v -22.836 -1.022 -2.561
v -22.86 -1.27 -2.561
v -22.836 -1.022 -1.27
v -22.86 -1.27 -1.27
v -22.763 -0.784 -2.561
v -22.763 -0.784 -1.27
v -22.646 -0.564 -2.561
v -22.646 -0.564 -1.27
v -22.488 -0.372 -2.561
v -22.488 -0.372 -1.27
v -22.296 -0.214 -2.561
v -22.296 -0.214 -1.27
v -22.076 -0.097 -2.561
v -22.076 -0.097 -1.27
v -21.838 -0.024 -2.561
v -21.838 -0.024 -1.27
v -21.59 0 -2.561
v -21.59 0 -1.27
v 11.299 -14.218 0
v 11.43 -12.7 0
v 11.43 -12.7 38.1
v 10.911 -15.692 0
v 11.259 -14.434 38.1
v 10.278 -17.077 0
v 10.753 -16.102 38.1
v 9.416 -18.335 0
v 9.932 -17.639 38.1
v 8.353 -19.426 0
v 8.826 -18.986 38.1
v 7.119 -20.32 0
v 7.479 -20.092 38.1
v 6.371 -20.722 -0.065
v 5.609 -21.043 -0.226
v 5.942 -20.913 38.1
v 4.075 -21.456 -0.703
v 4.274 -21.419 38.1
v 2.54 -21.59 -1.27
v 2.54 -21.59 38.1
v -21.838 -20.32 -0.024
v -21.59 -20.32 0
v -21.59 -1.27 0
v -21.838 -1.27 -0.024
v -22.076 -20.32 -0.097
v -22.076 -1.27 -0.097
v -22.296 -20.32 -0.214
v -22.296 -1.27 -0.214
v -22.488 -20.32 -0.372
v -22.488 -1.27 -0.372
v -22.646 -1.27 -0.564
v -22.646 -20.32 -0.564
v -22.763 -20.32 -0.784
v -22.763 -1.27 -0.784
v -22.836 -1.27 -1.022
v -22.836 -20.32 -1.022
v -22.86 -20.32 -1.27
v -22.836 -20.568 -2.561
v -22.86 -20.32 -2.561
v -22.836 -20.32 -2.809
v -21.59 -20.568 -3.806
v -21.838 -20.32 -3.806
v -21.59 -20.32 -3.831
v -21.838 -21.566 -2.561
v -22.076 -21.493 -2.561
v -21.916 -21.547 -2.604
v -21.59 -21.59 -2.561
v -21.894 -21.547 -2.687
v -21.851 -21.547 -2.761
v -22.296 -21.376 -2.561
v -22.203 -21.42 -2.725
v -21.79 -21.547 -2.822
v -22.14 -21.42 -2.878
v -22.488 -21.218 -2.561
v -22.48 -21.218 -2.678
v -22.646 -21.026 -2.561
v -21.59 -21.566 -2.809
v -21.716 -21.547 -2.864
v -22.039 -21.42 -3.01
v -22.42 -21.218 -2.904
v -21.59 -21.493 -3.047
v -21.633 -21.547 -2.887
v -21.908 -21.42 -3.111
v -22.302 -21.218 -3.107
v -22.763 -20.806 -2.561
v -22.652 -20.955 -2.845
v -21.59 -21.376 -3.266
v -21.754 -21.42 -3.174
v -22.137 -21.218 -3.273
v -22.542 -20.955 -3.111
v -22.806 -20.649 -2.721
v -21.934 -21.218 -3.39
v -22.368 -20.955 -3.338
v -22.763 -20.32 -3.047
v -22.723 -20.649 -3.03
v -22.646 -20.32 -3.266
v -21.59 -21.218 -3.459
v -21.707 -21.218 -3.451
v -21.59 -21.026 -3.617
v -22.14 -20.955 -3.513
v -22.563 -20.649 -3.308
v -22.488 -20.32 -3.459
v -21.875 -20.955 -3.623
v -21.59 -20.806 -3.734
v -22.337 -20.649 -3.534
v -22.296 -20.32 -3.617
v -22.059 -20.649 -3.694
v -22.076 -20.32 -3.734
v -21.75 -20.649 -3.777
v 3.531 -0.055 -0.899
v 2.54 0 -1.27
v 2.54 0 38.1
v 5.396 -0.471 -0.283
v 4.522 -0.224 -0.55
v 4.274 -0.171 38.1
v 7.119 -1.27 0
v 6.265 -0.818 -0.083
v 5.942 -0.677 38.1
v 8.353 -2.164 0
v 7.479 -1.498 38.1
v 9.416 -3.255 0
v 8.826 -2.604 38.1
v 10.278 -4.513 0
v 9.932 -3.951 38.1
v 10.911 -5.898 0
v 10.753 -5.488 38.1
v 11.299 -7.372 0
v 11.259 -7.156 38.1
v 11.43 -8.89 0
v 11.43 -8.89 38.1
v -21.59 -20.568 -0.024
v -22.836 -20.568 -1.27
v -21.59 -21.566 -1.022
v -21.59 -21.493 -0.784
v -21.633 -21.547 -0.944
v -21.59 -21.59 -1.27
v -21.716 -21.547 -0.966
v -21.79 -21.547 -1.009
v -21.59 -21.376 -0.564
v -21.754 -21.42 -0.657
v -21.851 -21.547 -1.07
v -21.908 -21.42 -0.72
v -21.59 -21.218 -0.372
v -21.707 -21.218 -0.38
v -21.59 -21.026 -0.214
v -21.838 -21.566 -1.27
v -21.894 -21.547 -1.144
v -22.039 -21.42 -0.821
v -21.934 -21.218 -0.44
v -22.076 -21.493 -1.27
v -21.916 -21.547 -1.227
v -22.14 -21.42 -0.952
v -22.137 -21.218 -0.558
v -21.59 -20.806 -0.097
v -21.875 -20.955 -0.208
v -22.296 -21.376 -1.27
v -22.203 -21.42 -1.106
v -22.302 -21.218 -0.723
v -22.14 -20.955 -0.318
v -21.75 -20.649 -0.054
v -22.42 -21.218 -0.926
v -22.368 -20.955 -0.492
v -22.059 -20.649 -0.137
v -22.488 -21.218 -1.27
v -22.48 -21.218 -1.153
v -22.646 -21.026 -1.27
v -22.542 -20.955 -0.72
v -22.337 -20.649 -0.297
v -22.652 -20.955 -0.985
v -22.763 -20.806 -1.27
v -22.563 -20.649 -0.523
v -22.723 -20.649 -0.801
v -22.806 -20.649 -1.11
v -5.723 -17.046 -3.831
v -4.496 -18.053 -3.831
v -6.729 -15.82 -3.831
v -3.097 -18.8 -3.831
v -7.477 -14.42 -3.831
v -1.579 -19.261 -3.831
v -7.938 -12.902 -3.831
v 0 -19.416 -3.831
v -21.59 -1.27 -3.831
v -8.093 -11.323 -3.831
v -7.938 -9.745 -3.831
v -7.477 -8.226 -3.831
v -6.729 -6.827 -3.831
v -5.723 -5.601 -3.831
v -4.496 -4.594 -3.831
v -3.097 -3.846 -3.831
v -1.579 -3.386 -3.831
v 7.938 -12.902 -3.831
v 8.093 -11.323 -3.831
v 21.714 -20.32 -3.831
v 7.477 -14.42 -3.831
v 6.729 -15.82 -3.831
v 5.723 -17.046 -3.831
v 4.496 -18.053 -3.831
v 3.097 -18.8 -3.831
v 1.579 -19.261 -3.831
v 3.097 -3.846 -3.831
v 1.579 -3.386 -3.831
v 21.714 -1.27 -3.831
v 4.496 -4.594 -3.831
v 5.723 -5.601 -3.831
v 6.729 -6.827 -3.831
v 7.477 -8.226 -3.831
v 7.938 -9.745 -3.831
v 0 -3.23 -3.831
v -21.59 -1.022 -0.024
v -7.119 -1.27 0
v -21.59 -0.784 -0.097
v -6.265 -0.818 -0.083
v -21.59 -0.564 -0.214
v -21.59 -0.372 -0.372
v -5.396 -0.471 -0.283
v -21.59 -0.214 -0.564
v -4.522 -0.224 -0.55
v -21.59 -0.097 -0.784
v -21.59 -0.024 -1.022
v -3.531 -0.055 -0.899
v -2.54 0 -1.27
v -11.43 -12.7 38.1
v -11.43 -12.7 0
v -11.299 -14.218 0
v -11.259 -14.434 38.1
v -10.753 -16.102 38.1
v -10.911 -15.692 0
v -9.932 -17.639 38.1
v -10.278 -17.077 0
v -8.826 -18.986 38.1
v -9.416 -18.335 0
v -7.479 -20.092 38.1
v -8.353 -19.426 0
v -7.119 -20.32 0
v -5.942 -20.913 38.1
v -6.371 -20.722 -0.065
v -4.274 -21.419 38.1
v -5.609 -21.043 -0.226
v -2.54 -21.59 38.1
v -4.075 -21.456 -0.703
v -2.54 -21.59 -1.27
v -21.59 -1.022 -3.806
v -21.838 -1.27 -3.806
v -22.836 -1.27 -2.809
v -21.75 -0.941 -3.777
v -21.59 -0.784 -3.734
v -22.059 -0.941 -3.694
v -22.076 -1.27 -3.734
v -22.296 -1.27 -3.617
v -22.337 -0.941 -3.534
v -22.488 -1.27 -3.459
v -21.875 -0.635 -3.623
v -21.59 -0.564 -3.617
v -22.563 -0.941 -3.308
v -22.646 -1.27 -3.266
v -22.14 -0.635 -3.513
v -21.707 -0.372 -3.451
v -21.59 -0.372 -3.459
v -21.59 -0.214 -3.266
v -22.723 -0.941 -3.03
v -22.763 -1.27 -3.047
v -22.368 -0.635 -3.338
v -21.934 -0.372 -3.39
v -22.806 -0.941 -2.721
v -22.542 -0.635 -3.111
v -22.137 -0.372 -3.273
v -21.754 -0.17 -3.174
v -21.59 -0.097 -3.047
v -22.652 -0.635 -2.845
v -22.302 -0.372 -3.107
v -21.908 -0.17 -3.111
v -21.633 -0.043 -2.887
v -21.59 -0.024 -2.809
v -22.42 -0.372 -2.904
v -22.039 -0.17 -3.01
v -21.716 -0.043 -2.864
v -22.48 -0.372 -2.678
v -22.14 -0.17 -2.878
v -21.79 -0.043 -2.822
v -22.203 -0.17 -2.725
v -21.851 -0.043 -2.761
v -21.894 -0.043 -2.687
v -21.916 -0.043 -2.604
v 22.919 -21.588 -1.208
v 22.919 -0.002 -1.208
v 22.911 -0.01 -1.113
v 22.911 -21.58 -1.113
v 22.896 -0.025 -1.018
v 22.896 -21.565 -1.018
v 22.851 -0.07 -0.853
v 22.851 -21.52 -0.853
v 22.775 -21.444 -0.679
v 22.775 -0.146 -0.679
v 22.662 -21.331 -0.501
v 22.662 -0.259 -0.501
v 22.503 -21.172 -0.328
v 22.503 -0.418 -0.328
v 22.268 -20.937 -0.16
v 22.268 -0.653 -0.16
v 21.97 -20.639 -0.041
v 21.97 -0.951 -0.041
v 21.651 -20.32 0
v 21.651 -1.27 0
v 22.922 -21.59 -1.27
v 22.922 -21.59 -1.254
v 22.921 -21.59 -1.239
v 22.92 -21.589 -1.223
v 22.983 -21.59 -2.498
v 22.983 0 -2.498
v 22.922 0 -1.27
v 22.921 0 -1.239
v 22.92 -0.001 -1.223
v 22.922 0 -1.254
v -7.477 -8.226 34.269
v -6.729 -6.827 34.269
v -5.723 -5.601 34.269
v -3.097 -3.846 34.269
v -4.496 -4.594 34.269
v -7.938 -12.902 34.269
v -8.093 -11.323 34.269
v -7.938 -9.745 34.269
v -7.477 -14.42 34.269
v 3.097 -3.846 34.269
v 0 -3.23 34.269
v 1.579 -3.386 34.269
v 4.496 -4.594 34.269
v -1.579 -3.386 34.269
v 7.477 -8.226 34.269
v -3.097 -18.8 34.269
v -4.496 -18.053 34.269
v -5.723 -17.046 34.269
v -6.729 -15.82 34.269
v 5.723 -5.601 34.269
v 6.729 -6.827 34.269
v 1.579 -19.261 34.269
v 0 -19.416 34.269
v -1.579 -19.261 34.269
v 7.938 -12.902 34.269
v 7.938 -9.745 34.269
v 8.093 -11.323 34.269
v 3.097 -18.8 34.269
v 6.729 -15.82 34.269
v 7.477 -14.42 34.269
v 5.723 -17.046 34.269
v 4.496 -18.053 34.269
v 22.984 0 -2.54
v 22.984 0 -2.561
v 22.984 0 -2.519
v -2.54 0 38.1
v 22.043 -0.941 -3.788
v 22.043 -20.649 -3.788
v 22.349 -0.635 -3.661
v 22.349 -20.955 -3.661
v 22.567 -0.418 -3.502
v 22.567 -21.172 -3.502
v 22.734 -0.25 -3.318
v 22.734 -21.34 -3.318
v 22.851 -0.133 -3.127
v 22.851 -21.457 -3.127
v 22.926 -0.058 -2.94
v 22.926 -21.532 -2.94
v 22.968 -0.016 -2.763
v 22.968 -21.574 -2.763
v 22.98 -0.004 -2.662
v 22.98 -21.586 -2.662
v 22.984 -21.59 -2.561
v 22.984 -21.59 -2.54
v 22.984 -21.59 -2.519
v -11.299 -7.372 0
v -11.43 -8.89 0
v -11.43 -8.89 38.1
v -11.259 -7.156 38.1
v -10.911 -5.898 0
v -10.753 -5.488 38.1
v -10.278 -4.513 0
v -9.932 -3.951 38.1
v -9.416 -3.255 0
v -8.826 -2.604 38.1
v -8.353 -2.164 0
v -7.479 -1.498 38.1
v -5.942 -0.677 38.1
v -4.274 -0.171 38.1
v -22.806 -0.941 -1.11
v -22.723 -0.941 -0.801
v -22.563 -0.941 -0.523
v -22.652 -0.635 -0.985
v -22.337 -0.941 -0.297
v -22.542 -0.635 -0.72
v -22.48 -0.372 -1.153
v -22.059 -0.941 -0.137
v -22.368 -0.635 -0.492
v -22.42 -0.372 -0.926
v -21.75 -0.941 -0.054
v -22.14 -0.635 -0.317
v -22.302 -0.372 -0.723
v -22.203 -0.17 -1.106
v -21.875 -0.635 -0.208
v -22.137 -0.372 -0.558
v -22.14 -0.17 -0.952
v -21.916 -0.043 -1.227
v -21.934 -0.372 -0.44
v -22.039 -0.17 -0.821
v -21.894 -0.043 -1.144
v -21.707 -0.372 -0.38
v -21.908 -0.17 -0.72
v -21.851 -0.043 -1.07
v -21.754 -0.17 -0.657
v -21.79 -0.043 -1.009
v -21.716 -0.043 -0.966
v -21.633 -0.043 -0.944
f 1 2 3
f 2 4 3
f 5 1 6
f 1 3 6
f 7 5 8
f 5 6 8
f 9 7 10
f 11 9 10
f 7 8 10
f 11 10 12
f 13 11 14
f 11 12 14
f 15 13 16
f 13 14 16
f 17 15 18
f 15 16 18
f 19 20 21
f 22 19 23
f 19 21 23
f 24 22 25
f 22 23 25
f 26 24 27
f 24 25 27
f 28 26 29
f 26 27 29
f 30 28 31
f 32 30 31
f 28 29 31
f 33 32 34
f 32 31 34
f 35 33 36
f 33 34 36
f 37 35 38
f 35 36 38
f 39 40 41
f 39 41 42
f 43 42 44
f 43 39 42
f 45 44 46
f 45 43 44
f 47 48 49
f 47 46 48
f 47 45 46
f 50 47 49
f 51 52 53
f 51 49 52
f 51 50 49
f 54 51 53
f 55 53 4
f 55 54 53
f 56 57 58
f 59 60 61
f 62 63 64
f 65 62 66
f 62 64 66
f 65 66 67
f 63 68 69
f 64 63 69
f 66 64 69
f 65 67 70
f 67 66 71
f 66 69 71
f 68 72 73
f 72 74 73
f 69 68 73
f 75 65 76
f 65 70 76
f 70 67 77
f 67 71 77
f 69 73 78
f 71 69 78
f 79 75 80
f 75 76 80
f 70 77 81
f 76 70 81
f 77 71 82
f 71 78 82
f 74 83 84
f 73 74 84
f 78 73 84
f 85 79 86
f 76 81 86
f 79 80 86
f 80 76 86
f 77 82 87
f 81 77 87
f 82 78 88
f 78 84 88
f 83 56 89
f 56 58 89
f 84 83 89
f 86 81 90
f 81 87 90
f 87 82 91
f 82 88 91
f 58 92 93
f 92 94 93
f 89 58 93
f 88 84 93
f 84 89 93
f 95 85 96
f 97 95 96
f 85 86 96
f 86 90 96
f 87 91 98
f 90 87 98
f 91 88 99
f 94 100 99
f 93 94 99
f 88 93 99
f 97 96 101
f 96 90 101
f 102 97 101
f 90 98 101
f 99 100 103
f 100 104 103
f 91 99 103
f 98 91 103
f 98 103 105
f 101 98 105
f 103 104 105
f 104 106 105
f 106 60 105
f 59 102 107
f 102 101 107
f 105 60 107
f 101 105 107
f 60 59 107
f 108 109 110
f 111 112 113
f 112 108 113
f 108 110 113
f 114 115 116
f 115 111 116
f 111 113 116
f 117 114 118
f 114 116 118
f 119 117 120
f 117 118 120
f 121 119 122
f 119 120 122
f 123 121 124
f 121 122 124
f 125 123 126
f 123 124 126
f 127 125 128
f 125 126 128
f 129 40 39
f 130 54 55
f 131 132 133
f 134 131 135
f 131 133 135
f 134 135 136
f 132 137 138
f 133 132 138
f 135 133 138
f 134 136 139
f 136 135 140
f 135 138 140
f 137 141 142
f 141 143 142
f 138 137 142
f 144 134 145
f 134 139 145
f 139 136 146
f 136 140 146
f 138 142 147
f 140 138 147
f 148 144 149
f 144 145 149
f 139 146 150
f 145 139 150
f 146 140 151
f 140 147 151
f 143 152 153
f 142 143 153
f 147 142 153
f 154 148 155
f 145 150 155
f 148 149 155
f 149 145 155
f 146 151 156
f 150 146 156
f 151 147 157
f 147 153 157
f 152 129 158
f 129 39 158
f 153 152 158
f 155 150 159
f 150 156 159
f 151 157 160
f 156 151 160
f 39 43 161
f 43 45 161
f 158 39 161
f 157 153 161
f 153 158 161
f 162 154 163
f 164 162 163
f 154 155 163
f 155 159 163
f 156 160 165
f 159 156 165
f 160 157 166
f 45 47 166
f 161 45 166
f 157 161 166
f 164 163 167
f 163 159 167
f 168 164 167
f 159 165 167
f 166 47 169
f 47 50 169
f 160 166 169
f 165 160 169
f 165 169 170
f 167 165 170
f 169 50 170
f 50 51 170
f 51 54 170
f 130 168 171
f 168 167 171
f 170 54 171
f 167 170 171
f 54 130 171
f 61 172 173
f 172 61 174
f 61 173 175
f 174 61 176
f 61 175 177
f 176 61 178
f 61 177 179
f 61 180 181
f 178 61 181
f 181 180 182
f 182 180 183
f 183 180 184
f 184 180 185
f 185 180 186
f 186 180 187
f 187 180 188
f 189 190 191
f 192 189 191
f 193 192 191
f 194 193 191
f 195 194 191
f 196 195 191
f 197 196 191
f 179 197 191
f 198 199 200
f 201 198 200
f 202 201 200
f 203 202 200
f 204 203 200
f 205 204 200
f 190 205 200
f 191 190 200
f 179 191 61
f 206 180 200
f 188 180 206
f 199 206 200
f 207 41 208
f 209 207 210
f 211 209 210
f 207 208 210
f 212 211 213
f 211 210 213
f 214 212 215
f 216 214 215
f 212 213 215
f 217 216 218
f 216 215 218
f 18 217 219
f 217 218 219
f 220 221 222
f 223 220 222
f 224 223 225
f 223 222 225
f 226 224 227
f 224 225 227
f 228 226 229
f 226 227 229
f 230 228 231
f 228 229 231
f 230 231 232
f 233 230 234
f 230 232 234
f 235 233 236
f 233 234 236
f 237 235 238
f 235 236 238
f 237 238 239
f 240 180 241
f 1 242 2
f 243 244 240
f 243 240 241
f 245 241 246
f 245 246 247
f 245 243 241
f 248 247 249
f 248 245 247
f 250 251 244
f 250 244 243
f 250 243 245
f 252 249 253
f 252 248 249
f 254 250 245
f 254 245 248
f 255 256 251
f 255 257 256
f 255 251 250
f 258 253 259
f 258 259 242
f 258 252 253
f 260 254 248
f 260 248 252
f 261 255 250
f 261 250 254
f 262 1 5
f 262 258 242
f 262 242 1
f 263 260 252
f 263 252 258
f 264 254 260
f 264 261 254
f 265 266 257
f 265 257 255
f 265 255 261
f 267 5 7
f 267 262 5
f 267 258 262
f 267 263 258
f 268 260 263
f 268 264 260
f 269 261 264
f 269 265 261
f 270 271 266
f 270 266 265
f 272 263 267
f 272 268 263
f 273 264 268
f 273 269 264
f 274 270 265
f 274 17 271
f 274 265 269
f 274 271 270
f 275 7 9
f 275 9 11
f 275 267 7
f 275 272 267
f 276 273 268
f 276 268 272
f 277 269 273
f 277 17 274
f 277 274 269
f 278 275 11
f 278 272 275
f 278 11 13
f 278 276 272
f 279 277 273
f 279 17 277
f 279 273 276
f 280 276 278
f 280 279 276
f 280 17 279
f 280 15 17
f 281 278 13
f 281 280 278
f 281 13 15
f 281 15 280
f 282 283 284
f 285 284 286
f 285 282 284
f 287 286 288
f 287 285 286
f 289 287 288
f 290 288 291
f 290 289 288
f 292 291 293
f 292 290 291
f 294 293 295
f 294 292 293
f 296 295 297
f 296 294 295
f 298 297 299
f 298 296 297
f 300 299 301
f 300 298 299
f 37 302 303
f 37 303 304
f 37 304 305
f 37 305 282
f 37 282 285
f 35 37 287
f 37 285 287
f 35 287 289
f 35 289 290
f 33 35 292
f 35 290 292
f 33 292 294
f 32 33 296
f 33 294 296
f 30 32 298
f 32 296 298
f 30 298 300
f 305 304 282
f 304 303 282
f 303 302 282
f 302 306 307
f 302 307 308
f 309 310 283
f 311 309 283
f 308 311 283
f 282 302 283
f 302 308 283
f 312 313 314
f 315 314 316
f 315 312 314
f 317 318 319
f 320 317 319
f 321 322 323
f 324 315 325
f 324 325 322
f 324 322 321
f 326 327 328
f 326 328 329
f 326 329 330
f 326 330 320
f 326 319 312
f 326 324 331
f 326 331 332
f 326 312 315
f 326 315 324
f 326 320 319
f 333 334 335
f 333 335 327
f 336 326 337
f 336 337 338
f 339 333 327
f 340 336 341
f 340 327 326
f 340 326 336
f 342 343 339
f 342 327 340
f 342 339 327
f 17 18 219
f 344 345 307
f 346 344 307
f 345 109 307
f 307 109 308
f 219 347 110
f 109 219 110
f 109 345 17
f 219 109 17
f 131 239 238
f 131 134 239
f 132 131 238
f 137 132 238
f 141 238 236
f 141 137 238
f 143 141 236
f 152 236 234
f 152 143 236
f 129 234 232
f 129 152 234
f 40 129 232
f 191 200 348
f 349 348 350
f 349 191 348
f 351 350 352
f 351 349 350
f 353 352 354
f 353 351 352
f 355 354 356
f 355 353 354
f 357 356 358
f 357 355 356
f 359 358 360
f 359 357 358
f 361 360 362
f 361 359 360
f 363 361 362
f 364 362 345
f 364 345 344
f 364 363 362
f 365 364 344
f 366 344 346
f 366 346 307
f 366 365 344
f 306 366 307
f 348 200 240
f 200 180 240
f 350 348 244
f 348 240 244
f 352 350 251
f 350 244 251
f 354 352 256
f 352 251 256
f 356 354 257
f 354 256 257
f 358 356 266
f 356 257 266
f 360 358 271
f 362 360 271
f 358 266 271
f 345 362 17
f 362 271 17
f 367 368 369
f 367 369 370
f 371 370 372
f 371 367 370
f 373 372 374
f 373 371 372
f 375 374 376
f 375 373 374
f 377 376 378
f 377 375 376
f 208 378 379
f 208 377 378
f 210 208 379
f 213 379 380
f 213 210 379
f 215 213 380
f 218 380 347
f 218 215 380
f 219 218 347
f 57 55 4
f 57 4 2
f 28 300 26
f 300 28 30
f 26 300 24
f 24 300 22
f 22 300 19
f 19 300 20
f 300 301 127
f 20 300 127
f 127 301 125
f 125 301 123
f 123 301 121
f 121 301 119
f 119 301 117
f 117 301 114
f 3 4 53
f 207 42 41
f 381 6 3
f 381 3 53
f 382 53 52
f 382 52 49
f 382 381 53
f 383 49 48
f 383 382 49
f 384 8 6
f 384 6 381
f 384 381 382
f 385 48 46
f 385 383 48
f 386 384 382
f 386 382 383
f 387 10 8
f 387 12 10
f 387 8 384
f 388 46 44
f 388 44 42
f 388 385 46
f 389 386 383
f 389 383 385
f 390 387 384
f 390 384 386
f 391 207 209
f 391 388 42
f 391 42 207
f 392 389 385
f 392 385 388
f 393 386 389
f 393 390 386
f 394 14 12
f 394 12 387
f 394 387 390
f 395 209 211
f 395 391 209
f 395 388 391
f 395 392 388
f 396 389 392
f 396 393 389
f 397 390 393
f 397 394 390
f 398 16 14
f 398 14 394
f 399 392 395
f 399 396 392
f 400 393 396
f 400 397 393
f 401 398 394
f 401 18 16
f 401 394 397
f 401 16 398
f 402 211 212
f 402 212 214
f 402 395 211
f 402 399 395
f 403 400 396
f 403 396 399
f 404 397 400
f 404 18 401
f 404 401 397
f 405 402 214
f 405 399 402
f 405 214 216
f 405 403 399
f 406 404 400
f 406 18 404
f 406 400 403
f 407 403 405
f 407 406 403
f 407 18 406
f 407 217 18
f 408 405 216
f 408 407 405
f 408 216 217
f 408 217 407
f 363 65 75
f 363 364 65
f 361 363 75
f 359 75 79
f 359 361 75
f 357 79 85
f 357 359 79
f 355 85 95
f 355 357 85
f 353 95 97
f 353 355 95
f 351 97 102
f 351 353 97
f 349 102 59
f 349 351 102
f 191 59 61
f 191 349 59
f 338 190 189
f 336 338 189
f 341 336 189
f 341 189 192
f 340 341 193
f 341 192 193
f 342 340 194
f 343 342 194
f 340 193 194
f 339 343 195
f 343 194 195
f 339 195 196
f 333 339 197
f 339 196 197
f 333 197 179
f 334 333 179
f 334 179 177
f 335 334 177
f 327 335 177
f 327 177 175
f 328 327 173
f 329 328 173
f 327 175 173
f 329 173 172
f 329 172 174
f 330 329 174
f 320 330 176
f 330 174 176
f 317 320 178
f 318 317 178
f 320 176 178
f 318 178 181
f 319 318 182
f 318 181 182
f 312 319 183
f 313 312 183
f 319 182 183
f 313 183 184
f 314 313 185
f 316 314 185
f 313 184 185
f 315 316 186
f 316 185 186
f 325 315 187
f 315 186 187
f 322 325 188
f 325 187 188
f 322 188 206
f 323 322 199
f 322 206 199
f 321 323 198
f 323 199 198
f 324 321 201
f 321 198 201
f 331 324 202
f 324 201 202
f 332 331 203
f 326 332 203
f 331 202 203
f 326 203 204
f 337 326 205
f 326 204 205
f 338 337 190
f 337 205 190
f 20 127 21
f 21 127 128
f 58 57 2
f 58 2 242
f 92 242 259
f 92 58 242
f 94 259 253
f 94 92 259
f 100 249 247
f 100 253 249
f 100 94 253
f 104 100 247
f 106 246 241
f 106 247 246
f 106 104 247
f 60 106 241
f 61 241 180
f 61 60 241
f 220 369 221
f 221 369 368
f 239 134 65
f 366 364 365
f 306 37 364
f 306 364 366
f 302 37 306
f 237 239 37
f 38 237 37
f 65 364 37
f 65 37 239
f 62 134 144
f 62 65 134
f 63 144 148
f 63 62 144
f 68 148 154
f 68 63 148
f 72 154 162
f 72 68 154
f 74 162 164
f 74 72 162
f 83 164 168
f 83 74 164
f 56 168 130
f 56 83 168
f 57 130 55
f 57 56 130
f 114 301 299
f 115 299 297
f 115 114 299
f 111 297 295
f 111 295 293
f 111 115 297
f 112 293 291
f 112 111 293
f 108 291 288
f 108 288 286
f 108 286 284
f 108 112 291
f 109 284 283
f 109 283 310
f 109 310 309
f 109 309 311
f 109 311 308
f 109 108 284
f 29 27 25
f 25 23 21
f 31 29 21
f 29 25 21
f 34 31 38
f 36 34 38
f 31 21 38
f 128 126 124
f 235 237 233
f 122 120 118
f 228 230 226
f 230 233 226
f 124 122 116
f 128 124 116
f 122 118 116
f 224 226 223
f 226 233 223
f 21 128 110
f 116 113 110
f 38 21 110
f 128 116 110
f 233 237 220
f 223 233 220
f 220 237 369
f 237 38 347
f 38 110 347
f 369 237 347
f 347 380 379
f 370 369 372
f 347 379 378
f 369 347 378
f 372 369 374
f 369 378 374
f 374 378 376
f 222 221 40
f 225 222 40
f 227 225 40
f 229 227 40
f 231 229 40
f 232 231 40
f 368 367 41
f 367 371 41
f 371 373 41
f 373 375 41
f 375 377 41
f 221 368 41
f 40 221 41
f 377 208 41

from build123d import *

# Parameters (mm, degrees)
F1_DEPTH = 21.59
F2_R     = 8.89
F3_R     = 8.89
F4_R     = 1.27
F5_R     = 1.27
F6_R     = 1.27
F7_R     = 8.093048
F8_DEPTH = 38.1


with BuildPart() as f1:
    # F0 (on Front) → F1 (new body)
    with BuildSketch(Plane.XZ):
        Polygon((-11.43, 0), (-22.86, 0), (-22.86, -3.830776), (23.048284, -3.830776), (22.86, 0), (11.43, 0), (0, 0), align=None)
        Polygon((-11.43, 38.1), (-11.43, 0), (0, 0), (11.43, 0), (11.43, 38.1), align=None)
    extrude(amount=F1_DEPTH)

    # F2
    f2_edges = [f1.edges().sort_by_distance(p)[0] for p in [
        (11.43, -21.59, 19.05),
    ]]
    fillet(f2_edges, radius=F2_R)

    # F3
    f3_edges = [f1.edges().sort_by_distance(p)[0] for p in [
        (-11.43, -21.59, 19.05),
        (11.43, 0, 19.05),
        (-11.43, 0, 19.05),
    ]]
    fillet(f3_edges, radius=F3_R)

    # F4
    f4_edges = [f1.edges().sort_by_distance(p)[0] for p in [
        (-22.86, -10.795, 0),
    ]]
    fillet(f4_edges, radius=F4_R)

    # F5
    f5_edges = [f1.edges().sort_by_distance(p)[0] for p in [
        (-22.86, -10.795, -3.830776),
    ]]
    fillet(f5_edges, radius=F5_R)

    # F6
    f6_edges = [f1.edges().sort_by_distance(p)[0] for p in [
        (-16.51, 0, 0),
        (0.729142, 0, -3.830776),
        (6.985, 0, 0),
        (22.86, -10.795, 0),
        (23.048284, -10.795, -3.830776),
        (17.145, -21.59, 0),
        (0.729142, -21.59, -3.830776),
        (-16.51, -21.59, 0),
    ]]
    fillet(f6_edges, radius=F6_R)

    # F7 (on face) → F8 (cut)
    with BuildSketch(Plane(origin=(0, 0, -3.830776), x_dir=(1, 0, 0), z_dir=(0, 0, -1))):
        with Locations((0, 11.323408)):
            Circle(F7_R)
    extrude(amount=-F8_DEPTH, mode=Mode.SUBTRACT)


solid = f1.part
